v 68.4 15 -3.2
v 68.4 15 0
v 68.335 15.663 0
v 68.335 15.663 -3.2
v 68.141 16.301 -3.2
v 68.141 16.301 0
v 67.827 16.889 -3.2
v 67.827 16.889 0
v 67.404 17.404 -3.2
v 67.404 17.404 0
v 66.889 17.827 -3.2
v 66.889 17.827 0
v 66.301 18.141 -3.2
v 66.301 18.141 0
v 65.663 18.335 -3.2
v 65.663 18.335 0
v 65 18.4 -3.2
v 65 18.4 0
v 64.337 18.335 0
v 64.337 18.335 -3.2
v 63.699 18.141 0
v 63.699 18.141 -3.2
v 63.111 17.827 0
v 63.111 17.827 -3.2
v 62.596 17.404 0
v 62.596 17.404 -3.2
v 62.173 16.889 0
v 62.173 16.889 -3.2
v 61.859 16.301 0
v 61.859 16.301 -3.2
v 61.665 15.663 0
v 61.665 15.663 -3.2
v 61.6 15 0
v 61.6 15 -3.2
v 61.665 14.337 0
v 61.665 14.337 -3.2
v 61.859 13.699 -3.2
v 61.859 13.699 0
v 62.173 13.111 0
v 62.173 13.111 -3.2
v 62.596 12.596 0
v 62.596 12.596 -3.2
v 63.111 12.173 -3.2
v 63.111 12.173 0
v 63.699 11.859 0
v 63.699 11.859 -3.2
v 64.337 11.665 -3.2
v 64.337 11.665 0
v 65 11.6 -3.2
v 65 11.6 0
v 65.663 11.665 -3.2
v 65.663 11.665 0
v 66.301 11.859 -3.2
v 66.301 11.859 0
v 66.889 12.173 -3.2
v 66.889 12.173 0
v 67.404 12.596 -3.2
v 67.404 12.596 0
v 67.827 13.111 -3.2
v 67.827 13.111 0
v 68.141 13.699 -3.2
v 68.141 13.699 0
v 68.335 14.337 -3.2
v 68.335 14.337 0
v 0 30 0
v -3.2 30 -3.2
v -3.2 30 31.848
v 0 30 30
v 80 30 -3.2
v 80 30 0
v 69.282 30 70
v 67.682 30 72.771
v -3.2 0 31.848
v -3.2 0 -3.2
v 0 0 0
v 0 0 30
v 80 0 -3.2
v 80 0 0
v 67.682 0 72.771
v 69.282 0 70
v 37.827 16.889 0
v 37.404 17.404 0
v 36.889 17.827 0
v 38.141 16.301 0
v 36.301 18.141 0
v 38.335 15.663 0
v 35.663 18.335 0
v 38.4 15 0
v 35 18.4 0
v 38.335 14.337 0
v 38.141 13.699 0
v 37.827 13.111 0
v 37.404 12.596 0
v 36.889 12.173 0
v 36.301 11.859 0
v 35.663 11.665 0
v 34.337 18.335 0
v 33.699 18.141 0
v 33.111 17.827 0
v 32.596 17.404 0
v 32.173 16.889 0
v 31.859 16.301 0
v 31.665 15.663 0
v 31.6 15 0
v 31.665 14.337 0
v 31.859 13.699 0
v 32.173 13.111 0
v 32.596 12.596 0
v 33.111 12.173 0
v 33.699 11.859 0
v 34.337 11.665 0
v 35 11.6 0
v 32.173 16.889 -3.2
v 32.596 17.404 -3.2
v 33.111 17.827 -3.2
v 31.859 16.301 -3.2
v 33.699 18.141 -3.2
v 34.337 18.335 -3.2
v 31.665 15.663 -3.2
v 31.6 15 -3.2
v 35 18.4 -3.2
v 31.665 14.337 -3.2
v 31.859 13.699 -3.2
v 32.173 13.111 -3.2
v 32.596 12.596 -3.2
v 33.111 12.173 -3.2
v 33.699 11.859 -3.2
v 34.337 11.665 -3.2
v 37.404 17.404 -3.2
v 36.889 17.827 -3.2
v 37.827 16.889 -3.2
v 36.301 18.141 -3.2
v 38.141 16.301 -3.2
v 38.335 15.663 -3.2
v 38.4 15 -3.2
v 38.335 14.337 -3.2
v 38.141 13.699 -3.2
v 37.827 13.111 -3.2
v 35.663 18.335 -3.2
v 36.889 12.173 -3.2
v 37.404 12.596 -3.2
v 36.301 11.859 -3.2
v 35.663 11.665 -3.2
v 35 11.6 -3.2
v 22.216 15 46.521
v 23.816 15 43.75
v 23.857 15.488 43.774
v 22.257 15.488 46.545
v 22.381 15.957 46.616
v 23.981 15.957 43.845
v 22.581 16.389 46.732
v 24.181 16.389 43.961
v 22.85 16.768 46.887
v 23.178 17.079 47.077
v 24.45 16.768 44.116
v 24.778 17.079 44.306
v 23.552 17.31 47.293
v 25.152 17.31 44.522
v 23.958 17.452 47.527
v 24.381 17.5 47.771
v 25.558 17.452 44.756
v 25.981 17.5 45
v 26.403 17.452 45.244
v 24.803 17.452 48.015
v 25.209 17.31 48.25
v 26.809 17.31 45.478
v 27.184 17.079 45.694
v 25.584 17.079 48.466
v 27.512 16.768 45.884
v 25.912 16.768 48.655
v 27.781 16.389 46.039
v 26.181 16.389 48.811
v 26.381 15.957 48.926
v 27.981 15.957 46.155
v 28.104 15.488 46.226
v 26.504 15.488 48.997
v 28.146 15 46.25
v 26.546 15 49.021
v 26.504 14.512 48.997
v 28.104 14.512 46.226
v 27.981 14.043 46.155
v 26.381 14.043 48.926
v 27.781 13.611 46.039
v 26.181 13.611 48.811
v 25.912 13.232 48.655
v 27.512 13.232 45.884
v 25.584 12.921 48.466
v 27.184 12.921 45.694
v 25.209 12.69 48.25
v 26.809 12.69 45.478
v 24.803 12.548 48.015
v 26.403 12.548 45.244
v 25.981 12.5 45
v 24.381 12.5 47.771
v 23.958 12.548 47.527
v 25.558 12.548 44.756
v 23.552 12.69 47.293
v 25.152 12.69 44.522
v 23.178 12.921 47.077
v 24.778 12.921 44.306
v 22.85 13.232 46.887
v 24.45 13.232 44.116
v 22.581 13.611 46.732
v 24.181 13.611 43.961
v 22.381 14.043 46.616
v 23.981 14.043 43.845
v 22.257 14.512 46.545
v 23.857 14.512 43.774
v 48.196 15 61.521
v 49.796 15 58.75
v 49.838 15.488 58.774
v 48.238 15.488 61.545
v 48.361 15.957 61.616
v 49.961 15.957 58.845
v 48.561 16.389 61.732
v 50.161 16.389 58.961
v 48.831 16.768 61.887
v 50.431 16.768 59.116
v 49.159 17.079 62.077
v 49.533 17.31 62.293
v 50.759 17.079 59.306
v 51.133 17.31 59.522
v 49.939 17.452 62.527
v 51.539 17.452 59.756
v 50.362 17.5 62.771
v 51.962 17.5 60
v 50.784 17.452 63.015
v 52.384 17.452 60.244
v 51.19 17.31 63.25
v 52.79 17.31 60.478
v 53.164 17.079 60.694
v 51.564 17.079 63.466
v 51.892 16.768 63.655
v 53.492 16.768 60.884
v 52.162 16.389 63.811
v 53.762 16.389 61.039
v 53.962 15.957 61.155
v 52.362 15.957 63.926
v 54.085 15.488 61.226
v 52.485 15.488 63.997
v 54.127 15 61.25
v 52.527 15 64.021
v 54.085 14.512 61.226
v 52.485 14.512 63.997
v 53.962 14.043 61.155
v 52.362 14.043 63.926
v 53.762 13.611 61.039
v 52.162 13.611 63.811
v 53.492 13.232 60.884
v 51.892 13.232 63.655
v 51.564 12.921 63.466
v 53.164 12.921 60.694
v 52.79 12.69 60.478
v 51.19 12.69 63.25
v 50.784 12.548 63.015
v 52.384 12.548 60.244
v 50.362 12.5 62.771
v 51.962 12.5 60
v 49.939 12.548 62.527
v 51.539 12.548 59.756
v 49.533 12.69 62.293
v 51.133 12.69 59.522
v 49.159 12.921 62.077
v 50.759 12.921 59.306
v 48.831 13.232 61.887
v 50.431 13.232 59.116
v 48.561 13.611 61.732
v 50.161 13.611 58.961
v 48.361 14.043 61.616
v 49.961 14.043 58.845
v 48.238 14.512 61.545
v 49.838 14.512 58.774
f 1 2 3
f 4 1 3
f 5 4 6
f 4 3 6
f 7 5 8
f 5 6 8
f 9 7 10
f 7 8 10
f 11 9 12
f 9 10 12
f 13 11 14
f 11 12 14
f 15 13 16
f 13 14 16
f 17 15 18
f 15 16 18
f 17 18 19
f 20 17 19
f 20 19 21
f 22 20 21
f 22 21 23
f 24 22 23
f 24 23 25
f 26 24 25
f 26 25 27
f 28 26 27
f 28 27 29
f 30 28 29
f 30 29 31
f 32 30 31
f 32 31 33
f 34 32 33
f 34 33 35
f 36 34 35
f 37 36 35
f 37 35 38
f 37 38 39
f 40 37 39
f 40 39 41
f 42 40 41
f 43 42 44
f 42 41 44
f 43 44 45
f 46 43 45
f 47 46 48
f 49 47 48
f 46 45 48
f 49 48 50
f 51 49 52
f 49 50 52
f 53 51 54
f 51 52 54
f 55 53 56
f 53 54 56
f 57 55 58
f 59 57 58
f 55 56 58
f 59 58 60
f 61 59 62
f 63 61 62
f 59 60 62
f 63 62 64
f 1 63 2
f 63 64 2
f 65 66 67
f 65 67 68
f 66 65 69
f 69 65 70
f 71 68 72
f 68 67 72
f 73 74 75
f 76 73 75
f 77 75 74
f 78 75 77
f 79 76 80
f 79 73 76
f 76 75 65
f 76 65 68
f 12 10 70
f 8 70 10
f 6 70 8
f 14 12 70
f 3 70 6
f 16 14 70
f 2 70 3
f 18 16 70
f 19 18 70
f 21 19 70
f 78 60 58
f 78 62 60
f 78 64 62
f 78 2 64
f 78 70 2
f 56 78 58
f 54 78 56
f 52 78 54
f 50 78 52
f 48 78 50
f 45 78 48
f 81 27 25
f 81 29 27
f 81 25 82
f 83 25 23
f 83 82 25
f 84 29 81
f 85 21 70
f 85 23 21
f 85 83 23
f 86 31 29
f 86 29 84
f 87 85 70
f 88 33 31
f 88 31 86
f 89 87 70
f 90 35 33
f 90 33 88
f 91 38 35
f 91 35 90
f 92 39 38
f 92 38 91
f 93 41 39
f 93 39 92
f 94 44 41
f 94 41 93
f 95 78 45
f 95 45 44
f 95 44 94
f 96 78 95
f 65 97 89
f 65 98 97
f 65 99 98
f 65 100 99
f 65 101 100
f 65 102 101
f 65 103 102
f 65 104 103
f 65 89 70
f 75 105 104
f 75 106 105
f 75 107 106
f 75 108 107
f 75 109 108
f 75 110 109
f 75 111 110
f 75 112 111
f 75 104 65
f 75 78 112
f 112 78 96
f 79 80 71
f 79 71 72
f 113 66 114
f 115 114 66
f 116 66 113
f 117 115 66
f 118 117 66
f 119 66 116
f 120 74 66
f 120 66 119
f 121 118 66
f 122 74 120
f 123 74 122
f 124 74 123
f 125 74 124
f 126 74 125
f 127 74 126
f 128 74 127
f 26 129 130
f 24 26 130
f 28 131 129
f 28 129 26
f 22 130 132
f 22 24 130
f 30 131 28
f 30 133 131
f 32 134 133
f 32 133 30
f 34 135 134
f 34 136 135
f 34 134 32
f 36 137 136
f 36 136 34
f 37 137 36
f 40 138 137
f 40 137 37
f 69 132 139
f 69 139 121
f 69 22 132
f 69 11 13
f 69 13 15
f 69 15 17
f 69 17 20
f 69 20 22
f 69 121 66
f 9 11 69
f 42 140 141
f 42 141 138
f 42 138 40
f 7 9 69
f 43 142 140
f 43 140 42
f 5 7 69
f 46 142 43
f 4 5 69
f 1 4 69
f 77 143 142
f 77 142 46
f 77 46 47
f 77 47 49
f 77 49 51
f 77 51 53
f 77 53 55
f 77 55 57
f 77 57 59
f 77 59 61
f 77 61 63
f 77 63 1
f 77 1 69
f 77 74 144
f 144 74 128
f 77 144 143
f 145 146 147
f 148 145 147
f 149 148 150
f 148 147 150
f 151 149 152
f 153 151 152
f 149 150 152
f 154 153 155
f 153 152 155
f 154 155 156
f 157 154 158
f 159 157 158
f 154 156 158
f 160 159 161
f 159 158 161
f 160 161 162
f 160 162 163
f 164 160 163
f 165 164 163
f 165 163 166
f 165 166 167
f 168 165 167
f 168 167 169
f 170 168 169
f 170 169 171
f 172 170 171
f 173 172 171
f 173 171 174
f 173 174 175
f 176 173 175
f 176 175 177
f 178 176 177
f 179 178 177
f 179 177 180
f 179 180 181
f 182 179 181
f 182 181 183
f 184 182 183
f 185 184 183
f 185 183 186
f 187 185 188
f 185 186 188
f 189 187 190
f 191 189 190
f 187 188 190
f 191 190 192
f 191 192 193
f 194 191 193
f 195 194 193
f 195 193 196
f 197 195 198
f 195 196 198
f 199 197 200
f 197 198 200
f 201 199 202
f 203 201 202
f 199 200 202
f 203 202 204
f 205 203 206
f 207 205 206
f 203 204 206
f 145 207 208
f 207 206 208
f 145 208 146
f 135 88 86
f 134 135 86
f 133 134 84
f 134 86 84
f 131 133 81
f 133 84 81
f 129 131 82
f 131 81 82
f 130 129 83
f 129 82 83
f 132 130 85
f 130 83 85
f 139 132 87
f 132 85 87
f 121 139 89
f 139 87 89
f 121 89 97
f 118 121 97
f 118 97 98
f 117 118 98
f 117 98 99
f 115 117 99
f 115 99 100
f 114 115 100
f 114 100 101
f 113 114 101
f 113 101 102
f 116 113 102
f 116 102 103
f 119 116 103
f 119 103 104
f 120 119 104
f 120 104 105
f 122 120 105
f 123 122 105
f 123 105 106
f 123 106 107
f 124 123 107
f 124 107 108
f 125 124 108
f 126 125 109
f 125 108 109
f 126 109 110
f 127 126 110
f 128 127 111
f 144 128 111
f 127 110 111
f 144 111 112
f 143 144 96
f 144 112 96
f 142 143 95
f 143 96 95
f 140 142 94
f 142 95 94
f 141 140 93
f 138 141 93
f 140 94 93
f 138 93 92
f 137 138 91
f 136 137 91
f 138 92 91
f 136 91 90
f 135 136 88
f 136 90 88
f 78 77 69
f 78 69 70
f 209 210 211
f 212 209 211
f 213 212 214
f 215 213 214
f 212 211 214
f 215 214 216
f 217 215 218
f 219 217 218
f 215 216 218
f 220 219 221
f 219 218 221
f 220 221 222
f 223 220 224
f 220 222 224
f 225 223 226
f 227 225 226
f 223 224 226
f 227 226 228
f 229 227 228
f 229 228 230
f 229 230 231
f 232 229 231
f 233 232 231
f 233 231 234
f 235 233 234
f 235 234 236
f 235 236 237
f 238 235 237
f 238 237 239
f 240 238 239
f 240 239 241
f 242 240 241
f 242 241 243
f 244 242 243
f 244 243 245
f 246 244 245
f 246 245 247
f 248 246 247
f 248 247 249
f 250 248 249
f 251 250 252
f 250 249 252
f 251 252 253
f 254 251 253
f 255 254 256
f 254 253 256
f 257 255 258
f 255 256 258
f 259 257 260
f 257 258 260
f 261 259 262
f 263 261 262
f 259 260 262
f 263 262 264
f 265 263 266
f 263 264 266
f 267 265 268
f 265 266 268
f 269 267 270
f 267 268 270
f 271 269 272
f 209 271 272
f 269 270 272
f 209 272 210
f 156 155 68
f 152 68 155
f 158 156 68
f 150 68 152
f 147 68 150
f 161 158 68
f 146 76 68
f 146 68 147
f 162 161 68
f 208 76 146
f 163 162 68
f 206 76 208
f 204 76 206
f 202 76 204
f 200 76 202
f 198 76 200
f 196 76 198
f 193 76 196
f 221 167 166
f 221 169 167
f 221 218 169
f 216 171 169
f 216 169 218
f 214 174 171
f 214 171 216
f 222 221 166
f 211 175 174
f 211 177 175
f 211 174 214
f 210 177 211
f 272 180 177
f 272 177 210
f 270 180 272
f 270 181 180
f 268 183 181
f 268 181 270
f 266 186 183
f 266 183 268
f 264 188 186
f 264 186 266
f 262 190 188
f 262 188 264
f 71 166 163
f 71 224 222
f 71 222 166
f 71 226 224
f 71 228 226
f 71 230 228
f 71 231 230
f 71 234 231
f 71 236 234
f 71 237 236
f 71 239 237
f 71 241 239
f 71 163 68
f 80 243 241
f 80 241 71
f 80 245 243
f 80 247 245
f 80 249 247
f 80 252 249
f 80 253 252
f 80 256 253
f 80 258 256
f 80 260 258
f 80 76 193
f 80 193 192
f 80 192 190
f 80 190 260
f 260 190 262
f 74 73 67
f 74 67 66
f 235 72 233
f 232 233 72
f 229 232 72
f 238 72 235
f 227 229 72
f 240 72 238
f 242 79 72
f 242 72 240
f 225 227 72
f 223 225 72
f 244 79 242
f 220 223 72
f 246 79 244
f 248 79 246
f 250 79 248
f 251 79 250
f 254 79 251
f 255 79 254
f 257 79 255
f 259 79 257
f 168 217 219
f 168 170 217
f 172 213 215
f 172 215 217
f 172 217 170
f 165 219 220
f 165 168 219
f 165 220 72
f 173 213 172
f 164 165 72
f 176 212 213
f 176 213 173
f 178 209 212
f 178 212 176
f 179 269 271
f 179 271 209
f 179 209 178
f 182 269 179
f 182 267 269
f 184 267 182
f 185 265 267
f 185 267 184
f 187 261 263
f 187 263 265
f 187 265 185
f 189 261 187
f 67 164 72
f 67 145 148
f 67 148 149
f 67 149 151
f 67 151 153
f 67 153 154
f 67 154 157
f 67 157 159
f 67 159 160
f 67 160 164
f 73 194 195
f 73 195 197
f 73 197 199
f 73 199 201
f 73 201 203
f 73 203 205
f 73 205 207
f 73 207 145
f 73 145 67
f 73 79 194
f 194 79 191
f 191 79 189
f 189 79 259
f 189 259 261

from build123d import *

# Parameters (mm, degrees)
F1_DEPTH = 30
F3_D     = 6.8
F3_DEPTH = 3.201
F5_D     = 5
F5_DEPTH = 6.2
F5_TIP   = 1.5021515476


with BuildPart() as f1:
    # F0 (on Front) → F1 (new body)
    with BuildSketch(Plane.XZ):
        Polygon((80, 0), (0, 0), (0, 30), (69.2820323028, 70), (67.6820323028, 72.7712812921), (-3.2, 31.8475208614), (-3.2, -3.2), (80, -3.2), align=None)
    extrude(amount=-F1_DEPTH)

    # F3 (through all, one way)
    with BuildSketch(Plane.XY):
        with Locations((35, 15), (65, 15)):
            Circle(F3_D / 2)
    extrude(amount=-F3_DEPTH, mode=Mode.SUBTRACT)

    # F5
    with Locations(Plane(origin=(-14.5903810568, 0, 25.2712812921), x_dir=(0.8660254038, 0, 0.5), z_dir=(-0.5, 0, 0.8660254038))):
        with Locations((75, 15), (45, 15)):
            Hole(F5_D / 2, depth=F5_DEPTH)
            with Locations((0, 0, -(F5_DEPTH + F5_TIP / 2))):  # 118° drill point
                Cone(0, F5_D / 2, F5_TIP, mode=Mode.SUBTRACT)


solid = f1.part
